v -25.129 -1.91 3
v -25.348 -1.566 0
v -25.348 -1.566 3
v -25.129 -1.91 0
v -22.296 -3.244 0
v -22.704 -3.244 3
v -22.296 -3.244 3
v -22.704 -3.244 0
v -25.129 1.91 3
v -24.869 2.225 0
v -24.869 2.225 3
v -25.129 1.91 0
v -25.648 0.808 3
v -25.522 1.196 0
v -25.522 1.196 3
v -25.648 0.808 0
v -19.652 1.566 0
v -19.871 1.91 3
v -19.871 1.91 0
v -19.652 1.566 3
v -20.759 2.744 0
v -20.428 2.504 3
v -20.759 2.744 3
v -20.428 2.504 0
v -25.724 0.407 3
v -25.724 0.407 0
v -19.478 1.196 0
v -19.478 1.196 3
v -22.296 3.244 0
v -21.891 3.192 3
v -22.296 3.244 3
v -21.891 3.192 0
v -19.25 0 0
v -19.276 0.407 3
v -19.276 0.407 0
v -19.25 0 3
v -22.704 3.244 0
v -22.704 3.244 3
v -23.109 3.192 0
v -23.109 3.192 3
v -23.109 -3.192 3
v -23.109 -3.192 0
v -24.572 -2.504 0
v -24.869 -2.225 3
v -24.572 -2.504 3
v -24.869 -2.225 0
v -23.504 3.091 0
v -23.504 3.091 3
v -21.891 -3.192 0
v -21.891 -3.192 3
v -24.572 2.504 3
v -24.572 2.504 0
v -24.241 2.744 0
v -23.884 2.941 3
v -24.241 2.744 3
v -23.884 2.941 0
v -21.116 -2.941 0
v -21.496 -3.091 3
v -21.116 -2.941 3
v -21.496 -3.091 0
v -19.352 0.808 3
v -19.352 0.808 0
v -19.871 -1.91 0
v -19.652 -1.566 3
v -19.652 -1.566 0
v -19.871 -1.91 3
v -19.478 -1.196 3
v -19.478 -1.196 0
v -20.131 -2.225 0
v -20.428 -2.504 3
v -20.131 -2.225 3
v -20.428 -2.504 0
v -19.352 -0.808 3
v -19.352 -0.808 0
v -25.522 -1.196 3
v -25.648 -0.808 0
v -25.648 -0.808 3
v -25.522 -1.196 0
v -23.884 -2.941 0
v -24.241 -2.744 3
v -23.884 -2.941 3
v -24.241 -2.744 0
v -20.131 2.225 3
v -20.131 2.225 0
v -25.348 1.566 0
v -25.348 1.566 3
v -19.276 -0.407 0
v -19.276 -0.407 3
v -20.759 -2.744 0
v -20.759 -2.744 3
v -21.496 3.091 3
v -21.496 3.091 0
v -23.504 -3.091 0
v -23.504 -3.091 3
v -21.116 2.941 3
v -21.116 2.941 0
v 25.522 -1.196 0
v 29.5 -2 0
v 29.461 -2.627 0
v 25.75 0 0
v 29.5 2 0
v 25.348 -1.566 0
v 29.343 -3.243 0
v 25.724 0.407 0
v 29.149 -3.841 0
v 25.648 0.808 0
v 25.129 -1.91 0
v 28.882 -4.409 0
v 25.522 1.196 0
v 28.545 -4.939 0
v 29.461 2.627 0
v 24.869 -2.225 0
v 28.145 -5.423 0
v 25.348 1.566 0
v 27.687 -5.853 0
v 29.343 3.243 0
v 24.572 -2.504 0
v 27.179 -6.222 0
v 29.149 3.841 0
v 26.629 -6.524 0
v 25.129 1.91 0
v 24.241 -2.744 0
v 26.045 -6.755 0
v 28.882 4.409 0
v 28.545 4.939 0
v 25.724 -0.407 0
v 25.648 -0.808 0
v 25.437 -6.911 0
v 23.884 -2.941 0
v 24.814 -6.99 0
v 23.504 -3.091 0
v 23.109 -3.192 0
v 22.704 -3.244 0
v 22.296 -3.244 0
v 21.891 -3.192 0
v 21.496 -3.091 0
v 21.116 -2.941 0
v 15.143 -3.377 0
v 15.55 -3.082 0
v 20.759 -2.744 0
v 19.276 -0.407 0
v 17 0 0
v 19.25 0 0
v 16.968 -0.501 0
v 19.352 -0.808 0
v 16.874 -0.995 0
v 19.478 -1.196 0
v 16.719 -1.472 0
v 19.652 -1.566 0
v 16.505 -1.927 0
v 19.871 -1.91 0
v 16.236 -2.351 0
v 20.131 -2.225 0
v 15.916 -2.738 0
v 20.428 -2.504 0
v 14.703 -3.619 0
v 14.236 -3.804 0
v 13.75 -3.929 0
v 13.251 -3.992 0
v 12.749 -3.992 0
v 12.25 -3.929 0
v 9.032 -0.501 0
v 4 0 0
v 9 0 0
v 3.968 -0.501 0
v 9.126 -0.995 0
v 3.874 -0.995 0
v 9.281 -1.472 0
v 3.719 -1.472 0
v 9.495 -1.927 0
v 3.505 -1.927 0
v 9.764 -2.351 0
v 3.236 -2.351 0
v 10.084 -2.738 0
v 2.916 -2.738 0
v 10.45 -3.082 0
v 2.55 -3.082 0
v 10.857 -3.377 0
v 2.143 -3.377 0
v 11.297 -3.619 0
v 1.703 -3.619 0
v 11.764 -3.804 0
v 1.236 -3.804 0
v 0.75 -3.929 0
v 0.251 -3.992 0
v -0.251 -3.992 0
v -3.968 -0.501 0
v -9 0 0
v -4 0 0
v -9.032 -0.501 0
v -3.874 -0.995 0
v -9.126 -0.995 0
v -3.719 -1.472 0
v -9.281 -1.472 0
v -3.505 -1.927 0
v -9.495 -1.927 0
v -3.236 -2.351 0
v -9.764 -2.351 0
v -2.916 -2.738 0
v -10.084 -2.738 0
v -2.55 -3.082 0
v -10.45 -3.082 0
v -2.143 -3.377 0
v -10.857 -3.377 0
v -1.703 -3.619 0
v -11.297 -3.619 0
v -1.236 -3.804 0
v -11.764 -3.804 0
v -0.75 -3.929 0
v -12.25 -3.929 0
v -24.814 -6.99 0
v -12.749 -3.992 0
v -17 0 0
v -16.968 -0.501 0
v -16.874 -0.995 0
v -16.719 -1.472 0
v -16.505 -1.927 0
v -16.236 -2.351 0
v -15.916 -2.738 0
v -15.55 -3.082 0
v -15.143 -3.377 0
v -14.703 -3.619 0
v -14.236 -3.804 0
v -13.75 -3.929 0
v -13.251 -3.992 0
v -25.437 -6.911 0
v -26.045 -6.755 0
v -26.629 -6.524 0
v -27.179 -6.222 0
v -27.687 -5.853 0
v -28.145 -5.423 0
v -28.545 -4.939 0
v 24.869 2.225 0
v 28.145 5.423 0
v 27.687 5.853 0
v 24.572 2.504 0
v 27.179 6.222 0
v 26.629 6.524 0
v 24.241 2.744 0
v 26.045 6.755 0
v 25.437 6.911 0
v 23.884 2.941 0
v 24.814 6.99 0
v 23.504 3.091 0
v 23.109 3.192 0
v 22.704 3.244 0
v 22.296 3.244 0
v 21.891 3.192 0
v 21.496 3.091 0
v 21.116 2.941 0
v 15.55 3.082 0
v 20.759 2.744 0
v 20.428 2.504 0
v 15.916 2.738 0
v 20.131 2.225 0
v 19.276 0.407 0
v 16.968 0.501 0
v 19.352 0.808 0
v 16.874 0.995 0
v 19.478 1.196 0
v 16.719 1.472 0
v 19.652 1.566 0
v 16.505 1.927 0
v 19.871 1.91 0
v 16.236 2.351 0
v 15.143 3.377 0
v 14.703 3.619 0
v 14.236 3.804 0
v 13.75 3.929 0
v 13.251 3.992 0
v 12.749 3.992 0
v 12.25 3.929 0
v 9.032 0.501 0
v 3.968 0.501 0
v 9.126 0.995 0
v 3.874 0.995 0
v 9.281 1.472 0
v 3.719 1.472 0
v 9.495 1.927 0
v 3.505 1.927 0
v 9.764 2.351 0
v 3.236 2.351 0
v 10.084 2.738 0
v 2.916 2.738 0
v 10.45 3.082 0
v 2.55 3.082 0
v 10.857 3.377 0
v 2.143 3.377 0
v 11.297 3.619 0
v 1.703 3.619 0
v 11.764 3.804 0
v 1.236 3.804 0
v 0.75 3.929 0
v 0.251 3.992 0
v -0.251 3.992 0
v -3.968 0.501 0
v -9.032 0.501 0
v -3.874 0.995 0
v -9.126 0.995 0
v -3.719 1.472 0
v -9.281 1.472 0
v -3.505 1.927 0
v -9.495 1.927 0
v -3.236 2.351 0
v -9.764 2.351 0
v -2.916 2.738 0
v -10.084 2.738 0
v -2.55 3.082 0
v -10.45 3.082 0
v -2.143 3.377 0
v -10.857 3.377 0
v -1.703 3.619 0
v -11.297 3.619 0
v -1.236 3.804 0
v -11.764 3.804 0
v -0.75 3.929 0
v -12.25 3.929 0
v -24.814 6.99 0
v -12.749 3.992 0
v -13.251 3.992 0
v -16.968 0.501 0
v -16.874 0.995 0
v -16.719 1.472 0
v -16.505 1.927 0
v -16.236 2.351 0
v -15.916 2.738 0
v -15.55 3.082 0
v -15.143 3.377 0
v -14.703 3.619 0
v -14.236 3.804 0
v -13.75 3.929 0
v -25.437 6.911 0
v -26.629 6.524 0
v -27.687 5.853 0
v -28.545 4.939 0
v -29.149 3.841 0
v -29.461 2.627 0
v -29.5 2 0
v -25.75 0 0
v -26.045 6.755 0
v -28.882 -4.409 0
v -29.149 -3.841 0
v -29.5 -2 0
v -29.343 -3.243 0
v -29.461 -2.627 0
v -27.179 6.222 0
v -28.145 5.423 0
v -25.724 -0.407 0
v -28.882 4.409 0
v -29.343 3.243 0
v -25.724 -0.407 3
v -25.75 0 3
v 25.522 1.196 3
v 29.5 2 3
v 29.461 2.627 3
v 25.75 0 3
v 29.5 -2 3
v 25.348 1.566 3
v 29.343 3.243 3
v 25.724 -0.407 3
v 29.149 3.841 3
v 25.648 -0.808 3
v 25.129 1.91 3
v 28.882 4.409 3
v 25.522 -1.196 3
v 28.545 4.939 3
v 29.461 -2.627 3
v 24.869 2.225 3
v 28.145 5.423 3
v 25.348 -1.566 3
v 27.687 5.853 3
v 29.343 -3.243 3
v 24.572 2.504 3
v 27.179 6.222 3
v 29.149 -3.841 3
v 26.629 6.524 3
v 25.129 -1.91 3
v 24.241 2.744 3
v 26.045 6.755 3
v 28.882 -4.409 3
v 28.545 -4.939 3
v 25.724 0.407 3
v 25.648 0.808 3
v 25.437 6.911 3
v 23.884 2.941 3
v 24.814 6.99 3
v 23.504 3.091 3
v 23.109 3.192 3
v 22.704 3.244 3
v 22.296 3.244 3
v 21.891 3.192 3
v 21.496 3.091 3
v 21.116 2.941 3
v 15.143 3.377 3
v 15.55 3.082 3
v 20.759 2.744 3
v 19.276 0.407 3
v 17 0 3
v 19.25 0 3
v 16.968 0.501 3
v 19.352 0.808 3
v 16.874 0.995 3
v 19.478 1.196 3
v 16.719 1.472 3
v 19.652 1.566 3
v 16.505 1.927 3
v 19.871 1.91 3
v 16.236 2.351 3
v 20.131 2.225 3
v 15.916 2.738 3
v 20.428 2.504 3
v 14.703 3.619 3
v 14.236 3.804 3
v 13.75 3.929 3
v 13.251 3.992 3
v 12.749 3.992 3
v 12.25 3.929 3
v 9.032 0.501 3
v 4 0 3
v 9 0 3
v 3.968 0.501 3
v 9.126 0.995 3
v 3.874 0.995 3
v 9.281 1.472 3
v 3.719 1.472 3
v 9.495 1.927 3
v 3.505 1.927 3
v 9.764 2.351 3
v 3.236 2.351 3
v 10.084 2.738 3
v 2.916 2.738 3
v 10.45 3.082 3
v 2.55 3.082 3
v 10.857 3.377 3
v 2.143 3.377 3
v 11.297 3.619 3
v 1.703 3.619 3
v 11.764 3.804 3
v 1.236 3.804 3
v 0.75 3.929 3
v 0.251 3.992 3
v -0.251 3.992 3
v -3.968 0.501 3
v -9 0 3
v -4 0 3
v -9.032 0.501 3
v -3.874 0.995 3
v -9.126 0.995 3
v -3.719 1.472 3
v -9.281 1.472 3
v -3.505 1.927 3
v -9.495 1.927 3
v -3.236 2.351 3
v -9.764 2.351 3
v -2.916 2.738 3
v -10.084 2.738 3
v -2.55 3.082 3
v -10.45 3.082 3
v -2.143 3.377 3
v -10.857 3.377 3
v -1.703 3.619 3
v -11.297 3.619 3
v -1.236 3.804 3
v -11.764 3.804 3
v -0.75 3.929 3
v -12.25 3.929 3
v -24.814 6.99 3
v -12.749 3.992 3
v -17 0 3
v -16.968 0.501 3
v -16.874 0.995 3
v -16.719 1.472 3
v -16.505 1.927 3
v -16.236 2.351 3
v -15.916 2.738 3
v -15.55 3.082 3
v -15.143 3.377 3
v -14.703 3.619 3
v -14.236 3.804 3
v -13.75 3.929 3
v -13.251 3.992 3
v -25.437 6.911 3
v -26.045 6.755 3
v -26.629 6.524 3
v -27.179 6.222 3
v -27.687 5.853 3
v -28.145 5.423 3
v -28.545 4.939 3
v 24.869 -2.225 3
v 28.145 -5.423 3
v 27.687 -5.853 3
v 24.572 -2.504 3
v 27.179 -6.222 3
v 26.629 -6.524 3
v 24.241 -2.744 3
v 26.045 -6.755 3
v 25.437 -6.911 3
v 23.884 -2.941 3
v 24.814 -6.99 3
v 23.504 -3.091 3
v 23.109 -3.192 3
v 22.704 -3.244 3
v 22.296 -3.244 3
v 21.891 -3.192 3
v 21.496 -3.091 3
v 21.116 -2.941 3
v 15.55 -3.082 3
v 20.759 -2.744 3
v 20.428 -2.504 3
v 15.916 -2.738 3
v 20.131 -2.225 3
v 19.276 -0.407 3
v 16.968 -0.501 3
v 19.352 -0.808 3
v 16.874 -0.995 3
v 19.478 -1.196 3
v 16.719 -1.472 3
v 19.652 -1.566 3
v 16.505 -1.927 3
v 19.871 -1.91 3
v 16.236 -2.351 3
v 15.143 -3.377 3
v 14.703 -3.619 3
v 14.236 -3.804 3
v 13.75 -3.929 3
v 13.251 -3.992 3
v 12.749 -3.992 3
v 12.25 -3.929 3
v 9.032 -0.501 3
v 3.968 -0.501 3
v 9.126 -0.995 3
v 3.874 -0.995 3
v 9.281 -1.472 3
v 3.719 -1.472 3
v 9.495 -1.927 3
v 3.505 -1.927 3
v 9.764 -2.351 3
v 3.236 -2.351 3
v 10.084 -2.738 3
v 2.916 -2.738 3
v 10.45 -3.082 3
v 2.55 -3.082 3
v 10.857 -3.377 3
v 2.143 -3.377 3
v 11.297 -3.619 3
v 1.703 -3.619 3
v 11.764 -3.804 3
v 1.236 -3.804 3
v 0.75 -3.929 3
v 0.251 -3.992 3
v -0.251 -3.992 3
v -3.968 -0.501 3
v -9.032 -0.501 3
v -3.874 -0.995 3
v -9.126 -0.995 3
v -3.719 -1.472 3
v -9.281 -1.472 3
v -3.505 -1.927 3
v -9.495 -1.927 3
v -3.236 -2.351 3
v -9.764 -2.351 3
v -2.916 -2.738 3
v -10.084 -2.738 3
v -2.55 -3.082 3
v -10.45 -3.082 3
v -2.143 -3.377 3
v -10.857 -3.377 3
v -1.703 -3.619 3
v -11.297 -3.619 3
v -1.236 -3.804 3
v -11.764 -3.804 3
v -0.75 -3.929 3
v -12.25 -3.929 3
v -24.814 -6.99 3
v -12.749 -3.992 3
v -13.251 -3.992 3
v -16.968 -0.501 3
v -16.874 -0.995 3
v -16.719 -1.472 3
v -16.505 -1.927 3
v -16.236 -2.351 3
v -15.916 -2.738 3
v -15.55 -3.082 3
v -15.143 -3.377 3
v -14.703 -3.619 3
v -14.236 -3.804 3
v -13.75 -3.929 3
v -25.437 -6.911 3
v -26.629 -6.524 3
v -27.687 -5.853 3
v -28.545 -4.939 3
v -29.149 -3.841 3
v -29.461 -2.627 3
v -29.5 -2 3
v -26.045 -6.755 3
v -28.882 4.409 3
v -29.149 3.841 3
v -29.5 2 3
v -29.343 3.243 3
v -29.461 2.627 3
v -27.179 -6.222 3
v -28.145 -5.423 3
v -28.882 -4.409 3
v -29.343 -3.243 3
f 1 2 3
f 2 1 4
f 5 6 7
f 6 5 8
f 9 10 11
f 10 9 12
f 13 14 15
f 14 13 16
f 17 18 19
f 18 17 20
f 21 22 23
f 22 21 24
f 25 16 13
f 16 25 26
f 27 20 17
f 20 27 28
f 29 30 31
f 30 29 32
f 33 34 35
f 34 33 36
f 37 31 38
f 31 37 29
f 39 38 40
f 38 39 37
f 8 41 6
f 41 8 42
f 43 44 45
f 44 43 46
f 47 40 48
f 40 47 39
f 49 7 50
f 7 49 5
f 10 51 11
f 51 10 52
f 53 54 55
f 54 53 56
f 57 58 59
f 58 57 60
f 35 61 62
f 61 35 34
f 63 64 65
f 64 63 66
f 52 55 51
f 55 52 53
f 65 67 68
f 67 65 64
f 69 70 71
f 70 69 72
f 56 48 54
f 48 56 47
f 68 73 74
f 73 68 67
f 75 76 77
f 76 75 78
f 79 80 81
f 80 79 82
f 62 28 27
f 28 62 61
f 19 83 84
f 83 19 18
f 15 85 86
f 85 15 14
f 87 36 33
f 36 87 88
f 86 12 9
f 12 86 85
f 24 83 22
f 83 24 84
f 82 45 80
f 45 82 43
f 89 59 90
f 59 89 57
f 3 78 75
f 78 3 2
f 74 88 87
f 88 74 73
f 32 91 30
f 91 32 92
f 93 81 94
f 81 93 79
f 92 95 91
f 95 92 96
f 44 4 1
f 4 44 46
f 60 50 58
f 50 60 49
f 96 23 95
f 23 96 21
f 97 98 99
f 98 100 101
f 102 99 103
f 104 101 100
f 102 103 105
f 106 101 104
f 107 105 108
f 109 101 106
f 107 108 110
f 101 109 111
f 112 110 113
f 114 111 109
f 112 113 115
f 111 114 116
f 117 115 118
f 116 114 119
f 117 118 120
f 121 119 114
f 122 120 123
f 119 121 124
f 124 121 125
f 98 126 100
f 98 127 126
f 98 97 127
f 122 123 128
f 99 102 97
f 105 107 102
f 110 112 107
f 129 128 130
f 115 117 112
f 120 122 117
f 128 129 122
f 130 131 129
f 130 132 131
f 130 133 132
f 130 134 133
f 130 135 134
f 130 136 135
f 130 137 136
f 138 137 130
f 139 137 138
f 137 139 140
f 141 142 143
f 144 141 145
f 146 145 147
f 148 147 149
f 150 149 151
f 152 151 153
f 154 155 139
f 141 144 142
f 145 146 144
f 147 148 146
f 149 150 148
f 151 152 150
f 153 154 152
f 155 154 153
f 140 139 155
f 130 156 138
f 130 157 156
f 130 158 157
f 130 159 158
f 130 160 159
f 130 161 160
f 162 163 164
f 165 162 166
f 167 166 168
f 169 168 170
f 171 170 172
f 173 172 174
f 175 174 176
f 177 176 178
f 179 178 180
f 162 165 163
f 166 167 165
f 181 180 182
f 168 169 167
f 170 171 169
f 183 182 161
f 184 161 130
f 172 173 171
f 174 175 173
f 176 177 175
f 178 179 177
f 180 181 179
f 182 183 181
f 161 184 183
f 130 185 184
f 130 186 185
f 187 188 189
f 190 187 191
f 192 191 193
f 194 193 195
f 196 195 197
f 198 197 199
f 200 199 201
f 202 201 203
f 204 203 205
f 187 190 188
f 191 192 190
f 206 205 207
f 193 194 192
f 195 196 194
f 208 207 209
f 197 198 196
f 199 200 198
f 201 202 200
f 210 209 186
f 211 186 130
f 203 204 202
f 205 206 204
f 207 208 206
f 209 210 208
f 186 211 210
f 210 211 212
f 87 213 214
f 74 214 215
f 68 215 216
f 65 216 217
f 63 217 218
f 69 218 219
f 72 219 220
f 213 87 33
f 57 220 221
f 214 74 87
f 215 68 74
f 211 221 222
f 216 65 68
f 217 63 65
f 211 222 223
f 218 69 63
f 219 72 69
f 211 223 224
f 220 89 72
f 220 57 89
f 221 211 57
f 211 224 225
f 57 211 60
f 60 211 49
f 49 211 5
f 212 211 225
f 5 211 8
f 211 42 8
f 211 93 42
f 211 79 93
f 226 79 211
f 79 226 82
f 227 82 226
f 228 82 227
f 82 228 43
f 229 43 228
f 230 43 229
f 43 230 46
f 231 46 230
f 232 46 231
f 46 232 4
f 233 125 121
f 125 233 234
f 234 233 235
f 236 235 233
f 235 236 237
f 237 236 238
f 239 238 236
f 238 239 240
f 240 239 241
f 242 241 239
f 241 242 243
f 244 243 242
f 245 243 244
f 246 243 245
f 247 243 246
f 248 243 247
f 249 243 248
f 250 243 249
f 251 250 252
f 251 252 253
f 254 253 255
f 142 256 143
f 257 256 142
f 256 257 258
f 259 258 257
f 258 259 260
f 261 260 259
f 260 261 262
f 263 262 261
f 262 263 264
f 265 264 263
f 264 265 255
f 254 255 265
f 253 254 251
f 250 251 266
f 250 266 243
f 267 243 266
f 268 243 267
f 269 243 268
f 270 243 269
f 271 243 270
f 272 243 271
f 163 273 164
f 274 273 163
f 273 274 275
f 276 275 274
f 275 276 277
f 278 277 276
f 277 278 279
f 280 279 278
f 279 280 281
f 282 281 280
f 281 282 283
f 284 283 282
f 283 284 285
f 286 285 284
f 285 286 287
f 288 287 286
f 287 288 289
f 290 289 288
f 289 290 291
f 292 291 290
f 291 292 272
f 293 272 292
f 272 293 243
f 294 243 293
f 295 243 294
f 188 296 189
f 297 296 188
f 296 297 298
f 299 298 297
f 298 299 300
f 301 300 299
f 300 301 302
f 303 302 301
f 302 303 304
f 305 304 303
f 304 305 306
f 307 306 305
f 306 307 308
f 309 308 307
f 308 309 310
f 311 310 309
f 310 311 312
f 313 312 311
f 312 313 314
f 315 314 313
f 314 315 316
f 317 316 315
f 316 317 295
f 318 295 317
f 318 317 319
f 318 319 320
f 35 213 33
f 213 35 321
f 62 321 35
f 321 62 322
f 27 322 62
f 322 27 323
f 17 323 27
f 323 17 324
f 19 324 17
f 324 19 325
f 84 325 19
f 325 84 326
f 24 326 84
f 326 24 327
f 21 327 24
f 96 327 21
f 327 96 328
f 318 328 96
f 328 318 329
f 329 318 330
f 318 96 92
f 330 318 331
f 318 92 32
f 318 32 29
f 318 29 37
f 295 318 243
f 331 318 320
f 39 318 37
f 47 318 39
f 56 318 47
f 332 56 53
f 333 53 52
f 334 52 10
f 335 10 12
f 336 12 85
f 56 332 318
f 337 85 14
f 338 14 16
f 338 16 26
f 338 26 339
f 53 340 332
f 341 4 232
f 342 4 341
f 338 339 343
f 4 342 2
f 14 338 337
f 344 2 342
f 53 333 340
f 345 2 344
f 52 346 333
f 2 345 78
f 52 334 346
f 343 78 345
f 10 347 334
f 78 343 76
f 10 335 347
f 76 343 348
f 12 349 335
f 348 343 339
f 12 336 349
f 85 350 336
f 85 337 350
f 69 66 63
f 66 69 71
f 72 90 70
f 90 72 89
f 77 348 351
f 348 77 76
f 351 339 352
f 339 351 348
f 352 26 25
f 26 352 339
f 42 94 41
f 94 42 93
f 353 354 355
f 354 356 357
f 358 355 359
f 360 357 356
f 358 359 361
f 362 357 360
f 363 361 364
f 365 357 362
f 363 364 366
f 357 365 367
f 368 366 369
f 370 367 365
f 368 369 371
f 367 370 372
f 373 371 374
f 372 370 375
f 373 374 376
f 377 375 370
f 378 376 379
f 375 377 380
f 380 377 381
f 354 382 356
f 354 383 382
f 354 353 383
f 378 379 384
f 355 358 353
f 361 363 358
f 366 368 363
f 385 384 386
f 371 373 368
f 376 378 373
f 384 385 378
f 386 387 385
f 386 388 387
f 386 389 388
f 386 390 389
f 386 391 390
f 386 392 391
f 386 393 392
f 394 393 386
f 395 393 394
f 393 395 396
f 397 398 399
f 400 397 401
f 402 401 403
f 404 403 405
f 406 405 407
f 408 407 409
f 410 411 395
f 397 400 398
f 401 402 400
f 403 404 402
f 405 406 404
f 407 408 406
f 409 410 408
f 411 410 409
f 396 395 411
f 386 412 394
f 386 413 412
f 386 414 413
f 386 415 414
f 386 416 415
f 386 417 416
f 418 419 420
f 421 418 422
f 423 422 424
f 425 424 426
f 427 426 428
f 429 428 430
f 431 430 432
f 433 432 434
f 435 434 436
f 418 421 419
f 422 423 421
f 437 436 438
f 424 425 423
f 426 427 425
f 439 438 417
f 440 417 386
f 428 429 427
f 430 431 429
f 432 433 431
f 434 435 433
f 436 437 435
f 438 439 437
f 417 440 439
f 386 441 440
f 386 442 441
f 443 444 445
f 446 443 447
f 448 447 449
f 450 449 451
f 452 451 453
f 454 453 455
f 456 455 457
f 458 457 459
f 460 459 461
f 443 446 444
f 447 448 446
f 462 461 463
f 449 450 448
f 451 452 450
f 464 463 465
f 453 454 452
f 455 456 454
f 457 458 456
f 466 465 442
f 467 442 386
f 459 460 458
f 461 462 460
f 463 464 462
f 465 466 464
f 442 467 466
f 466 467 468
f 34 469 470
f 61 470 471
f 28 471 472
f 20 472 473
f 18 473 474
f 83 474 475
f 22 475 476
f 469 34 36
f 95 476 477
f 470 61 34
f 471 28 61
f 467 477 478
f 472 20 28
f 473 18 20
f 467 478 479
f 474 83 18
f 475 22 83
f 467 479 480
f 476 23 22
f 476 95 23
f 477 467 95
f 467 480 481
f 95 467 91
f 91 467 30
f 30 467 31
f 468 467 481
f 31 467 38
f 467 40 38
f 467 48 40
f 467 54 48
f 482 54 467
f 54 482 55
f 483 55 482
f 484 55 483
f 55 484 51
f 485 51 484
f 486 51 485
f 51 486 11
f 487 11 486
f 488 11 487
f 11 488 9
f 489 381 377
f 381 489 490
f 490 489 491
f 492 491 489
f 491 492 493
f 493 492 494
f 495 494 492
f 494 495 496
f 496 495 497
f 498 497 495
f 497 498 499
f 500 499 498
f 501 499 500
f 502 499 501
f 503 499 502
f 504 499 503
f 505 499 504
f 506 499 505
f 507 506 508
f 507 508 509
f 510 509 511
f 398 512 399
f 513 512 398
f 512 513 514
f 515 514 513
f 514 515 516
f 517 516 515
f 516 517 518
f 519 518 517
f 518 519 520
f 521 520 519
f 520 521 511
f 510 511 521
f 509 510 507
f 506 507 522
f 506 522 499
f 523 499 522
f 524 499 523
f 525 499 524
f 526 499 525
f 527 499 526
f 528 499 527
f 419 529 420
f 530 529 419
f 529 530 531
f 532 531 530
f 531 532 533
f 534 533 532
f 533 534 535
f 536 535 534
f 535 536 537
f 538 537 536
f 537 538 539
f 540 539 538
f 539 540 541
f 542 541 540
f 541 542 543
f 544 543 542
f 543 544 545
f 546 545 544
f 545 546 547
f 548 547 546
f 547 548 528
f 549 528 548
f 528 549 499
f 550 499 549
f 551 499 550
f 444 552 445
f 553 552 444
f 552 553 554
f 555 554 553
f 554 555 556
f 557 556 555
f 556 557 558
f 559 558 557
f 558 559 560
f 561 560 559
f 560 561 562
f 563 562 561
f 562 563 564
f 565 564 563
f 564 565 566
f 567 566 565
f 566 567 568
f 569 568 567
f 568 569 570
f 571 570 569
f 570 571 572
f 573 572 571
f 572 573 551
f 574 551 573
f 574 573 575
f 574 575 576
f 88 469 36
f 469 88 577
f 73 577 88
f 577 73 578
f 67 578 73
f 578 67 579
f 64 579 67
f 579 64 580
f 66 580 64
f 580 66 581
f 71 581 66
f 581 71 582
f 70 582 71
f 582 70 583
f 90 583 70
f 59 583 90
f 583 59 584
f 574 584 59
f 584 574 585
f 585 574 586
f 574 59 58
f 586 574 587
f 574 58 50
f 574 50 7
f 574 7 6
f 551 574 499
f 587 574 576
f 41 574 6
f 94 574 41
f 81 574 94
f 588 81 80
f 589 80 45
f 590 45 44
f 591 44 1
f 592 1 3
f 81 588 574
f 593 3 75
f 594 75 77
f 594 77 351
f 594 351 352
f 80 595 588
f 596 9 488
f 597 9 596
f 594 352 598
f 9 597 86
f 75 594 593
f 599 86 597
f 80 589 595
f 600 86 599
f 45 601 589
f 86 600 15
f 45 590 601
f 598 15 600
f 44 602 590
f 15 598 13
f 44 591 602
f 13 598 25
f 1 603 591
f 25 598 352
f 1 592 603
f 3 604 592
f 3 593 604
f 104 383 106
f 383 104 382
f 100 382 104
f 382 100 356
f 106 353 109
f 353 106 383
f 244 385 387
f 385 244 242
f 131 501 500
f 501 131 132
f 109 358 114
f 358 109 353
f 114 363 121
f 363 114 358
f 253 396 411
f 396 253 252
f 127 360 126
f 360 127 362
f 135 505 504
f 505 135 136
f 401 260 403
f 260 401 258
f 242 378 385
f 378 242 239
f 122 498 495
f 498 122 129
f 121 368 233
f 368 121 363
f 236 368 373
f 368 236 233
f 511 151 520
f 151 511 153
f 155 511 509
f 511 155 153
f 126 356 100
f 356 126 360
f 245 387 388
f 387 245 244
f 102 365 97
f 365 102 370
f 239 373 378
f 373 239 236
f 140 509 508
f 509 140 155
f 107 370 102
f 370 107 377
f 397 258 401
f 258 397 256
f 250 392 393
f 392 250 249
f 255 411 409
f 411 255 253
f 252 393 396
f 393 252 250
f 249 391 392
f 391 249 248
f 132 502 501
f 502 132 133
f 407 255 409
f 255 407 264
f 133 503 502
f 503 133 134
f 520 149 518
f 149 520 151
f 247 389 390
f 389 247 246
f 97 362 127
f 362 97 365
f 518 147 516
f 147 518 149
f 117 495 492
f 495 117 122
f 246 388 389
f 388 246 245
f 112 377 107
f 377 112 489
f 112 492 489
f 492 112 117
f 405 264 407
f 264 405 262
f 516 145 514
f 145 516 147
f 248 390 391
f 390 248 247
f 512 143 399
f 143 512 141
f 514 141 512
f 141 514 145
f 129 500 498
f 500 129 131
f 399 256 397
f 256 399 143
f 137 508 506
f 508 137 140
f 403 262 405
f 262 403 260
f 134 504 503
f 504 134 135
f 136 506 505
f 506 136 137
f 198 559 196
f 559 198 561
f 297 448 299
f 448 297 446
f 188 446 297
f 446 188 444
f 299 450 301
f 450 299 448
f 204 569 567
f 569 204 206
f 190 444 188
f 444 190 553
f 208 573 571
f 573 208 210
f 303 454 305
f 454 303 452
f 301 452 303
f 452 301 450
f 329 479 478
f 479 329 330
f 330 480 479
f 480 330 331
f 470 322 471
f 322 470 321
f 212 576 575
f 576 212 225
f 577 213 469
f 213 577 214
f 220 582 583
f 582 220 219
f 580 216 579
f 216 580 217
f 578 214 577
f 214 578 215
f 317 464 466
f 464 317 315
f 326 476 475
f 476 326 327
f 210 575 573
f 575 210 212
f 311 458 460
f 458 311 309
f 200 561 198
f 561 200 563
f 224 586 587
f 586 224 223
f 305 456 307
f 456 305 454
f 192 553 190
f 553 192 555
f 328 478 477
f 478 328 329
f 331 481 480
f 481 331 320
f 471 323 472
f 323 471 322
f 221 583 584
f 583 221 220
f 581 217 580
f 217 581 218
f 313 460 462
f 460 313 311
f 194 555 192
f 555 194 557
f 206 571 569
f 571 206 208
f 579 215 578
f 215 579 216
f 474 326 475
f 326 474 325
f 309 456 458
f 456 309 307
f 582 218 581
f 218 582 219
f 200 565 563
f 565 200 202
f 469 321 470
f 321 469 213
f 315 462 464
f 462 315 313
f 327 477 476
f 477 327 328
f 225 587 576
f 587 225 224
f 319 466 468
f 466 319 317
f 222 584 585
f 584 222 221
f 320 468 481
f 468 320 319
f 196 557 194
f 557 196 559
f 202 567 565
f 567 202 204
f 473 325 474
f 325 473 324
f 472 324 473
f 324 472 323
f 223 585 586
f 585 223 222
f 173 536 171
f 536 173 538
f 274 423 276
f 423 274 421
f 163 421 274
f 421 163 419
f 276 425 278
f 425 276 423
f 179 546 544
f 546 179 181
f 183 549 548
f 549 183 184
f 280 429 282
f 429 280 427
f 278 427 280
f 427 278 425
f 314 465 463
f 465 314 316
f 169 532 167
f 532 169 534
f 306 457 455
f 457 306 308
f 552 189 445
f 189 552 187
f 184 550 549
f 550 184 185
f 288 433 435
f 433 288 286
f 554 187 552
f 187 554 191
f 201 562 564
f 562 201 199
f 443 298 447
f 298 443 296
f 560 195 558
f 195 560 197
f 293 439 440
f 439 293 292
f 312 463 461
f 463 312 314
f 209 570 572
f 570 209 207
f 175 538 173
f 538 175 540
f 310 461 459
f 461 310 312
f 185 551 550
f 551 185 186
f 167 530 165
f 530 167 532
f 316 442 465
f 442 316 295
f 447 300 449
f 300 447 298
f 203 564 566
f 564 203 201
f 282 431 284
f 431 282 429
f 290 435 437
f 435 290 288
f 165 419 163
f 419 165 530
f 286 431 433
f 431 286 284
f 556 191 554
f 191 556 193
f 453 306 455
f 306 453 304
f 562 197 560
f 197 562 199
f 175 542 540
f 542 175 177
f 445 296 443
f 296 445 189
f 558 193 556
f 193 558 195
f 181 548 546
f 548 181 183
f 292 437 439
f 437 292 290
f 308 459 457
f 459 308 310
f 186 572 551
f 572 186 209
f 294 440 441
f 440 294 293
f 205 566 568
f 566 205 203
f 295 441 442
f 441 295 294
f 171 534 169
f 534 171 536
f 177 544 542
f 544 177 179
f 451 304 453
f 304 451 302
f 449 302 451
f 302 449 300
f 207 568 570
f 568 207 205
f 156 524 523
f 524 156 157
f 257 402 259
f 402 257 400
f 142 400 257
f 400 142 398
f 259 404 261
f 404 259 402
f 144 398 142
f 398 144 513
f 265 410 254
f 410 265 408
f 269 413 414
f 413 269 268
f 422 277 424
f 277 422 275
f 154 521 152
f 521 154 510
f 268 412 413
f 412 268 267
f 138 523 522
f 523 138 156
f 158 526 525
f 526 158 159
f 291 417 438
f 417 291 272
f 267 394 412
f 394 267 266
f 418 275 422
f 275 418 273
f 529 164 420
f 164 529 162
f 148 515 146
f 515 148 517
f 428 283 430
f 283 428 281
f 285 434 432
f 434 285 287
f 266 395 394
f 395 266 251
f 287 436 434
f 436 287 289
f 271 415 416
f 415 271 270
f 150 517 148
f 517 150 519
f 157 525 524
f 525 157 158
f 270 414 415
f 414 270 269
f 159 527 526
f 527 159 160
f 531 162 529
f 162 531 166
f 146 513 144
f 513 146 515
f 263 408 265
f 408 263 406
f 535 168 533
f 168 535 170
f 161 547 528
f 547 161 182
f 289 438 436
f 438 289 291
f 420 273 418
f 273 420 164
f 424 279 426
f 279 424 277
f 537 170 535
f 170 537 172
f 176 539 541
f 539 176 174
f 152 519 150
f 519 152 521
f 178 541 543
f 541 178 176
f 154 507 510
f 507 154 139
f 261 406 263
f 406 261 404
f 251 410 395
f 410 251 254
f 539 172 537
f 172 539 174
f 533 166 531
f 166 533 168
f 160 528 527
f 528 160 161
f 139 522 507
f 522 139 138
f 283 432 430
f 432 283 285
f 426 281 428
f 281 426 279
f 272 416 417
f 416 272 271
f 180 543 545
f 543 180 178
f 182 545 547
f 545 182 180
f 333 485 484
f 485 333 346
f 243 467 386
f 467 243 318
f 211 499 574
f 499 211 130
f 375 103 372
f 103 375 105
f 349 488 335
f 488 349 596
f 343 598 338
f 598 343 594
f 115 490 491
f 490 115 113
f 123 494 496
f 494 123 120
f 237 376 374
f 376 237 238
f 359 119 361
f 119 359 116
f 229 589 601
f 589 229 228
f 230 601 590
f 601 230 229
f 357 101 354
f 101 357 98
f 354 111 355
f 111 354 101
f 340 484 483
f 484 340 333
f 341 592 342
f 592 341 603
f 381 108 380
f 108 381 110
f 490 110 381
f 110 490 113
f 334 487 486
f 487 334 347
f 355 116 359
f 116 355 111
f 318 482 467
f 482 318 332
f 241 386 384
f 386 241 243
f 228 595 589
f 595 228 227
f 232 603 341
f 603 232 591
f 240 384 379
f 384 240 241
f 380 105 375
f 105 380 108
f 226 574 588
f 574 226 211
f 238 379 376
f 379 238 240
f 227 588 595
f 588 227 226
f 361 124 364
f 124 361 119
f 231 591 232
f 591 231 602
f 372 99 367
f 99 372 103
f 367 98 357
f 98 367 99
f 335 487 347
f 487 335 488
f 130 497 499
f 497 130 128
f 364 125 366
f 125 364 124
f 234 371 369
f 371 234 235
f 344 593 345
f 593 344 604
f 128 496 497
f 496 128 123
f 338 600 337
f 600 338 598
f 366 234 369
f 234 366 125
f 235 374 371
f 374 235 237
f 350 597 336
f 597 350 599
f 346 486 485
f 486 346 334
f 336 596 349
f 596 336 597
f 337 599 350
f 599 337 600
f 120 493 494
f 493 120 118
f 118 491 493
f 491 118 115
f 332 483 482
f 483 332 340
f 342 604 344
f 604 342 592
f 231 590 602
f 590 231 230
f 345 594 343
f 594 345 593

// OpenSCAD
$fn = 50;

difference() {
	union() {
		hull() {
			translate(v = [-24.5, 2.0, 0]) {
				cylinder(h = 3, r = 5);
			}
			translate(v = [24.5, 2.0, 0]) {
				cylinder(h = 3, r = 5);
			}
			translate(v = [-24.5, -2.0, 0]) {
				cylinder(h = 3, r = 5);
			}
			translate(v = [24.5, -2.0, 0]) {
				cylinder(h = 3, r = 5);
			}
		}
	}
	union() {
		translate(v = [-22.5, 0.0, 0]) {
			cylinder(h = 3, r = 3.25);
		}
		translate(v = [22.5, 0.0, 0]) {
			cylinder(h = 3, r = 3.25);
		}
		translate(v = [-13.0, 0, 0.0]) {
			cylinder(h = 3, r = 4.0);
		}
		cylinder(h = 3, r = 4.0);
		translate(v = [13.0, 0, 0.0]) {
			cylinder(h = 3, r = 4.0);
		}
	}
}
